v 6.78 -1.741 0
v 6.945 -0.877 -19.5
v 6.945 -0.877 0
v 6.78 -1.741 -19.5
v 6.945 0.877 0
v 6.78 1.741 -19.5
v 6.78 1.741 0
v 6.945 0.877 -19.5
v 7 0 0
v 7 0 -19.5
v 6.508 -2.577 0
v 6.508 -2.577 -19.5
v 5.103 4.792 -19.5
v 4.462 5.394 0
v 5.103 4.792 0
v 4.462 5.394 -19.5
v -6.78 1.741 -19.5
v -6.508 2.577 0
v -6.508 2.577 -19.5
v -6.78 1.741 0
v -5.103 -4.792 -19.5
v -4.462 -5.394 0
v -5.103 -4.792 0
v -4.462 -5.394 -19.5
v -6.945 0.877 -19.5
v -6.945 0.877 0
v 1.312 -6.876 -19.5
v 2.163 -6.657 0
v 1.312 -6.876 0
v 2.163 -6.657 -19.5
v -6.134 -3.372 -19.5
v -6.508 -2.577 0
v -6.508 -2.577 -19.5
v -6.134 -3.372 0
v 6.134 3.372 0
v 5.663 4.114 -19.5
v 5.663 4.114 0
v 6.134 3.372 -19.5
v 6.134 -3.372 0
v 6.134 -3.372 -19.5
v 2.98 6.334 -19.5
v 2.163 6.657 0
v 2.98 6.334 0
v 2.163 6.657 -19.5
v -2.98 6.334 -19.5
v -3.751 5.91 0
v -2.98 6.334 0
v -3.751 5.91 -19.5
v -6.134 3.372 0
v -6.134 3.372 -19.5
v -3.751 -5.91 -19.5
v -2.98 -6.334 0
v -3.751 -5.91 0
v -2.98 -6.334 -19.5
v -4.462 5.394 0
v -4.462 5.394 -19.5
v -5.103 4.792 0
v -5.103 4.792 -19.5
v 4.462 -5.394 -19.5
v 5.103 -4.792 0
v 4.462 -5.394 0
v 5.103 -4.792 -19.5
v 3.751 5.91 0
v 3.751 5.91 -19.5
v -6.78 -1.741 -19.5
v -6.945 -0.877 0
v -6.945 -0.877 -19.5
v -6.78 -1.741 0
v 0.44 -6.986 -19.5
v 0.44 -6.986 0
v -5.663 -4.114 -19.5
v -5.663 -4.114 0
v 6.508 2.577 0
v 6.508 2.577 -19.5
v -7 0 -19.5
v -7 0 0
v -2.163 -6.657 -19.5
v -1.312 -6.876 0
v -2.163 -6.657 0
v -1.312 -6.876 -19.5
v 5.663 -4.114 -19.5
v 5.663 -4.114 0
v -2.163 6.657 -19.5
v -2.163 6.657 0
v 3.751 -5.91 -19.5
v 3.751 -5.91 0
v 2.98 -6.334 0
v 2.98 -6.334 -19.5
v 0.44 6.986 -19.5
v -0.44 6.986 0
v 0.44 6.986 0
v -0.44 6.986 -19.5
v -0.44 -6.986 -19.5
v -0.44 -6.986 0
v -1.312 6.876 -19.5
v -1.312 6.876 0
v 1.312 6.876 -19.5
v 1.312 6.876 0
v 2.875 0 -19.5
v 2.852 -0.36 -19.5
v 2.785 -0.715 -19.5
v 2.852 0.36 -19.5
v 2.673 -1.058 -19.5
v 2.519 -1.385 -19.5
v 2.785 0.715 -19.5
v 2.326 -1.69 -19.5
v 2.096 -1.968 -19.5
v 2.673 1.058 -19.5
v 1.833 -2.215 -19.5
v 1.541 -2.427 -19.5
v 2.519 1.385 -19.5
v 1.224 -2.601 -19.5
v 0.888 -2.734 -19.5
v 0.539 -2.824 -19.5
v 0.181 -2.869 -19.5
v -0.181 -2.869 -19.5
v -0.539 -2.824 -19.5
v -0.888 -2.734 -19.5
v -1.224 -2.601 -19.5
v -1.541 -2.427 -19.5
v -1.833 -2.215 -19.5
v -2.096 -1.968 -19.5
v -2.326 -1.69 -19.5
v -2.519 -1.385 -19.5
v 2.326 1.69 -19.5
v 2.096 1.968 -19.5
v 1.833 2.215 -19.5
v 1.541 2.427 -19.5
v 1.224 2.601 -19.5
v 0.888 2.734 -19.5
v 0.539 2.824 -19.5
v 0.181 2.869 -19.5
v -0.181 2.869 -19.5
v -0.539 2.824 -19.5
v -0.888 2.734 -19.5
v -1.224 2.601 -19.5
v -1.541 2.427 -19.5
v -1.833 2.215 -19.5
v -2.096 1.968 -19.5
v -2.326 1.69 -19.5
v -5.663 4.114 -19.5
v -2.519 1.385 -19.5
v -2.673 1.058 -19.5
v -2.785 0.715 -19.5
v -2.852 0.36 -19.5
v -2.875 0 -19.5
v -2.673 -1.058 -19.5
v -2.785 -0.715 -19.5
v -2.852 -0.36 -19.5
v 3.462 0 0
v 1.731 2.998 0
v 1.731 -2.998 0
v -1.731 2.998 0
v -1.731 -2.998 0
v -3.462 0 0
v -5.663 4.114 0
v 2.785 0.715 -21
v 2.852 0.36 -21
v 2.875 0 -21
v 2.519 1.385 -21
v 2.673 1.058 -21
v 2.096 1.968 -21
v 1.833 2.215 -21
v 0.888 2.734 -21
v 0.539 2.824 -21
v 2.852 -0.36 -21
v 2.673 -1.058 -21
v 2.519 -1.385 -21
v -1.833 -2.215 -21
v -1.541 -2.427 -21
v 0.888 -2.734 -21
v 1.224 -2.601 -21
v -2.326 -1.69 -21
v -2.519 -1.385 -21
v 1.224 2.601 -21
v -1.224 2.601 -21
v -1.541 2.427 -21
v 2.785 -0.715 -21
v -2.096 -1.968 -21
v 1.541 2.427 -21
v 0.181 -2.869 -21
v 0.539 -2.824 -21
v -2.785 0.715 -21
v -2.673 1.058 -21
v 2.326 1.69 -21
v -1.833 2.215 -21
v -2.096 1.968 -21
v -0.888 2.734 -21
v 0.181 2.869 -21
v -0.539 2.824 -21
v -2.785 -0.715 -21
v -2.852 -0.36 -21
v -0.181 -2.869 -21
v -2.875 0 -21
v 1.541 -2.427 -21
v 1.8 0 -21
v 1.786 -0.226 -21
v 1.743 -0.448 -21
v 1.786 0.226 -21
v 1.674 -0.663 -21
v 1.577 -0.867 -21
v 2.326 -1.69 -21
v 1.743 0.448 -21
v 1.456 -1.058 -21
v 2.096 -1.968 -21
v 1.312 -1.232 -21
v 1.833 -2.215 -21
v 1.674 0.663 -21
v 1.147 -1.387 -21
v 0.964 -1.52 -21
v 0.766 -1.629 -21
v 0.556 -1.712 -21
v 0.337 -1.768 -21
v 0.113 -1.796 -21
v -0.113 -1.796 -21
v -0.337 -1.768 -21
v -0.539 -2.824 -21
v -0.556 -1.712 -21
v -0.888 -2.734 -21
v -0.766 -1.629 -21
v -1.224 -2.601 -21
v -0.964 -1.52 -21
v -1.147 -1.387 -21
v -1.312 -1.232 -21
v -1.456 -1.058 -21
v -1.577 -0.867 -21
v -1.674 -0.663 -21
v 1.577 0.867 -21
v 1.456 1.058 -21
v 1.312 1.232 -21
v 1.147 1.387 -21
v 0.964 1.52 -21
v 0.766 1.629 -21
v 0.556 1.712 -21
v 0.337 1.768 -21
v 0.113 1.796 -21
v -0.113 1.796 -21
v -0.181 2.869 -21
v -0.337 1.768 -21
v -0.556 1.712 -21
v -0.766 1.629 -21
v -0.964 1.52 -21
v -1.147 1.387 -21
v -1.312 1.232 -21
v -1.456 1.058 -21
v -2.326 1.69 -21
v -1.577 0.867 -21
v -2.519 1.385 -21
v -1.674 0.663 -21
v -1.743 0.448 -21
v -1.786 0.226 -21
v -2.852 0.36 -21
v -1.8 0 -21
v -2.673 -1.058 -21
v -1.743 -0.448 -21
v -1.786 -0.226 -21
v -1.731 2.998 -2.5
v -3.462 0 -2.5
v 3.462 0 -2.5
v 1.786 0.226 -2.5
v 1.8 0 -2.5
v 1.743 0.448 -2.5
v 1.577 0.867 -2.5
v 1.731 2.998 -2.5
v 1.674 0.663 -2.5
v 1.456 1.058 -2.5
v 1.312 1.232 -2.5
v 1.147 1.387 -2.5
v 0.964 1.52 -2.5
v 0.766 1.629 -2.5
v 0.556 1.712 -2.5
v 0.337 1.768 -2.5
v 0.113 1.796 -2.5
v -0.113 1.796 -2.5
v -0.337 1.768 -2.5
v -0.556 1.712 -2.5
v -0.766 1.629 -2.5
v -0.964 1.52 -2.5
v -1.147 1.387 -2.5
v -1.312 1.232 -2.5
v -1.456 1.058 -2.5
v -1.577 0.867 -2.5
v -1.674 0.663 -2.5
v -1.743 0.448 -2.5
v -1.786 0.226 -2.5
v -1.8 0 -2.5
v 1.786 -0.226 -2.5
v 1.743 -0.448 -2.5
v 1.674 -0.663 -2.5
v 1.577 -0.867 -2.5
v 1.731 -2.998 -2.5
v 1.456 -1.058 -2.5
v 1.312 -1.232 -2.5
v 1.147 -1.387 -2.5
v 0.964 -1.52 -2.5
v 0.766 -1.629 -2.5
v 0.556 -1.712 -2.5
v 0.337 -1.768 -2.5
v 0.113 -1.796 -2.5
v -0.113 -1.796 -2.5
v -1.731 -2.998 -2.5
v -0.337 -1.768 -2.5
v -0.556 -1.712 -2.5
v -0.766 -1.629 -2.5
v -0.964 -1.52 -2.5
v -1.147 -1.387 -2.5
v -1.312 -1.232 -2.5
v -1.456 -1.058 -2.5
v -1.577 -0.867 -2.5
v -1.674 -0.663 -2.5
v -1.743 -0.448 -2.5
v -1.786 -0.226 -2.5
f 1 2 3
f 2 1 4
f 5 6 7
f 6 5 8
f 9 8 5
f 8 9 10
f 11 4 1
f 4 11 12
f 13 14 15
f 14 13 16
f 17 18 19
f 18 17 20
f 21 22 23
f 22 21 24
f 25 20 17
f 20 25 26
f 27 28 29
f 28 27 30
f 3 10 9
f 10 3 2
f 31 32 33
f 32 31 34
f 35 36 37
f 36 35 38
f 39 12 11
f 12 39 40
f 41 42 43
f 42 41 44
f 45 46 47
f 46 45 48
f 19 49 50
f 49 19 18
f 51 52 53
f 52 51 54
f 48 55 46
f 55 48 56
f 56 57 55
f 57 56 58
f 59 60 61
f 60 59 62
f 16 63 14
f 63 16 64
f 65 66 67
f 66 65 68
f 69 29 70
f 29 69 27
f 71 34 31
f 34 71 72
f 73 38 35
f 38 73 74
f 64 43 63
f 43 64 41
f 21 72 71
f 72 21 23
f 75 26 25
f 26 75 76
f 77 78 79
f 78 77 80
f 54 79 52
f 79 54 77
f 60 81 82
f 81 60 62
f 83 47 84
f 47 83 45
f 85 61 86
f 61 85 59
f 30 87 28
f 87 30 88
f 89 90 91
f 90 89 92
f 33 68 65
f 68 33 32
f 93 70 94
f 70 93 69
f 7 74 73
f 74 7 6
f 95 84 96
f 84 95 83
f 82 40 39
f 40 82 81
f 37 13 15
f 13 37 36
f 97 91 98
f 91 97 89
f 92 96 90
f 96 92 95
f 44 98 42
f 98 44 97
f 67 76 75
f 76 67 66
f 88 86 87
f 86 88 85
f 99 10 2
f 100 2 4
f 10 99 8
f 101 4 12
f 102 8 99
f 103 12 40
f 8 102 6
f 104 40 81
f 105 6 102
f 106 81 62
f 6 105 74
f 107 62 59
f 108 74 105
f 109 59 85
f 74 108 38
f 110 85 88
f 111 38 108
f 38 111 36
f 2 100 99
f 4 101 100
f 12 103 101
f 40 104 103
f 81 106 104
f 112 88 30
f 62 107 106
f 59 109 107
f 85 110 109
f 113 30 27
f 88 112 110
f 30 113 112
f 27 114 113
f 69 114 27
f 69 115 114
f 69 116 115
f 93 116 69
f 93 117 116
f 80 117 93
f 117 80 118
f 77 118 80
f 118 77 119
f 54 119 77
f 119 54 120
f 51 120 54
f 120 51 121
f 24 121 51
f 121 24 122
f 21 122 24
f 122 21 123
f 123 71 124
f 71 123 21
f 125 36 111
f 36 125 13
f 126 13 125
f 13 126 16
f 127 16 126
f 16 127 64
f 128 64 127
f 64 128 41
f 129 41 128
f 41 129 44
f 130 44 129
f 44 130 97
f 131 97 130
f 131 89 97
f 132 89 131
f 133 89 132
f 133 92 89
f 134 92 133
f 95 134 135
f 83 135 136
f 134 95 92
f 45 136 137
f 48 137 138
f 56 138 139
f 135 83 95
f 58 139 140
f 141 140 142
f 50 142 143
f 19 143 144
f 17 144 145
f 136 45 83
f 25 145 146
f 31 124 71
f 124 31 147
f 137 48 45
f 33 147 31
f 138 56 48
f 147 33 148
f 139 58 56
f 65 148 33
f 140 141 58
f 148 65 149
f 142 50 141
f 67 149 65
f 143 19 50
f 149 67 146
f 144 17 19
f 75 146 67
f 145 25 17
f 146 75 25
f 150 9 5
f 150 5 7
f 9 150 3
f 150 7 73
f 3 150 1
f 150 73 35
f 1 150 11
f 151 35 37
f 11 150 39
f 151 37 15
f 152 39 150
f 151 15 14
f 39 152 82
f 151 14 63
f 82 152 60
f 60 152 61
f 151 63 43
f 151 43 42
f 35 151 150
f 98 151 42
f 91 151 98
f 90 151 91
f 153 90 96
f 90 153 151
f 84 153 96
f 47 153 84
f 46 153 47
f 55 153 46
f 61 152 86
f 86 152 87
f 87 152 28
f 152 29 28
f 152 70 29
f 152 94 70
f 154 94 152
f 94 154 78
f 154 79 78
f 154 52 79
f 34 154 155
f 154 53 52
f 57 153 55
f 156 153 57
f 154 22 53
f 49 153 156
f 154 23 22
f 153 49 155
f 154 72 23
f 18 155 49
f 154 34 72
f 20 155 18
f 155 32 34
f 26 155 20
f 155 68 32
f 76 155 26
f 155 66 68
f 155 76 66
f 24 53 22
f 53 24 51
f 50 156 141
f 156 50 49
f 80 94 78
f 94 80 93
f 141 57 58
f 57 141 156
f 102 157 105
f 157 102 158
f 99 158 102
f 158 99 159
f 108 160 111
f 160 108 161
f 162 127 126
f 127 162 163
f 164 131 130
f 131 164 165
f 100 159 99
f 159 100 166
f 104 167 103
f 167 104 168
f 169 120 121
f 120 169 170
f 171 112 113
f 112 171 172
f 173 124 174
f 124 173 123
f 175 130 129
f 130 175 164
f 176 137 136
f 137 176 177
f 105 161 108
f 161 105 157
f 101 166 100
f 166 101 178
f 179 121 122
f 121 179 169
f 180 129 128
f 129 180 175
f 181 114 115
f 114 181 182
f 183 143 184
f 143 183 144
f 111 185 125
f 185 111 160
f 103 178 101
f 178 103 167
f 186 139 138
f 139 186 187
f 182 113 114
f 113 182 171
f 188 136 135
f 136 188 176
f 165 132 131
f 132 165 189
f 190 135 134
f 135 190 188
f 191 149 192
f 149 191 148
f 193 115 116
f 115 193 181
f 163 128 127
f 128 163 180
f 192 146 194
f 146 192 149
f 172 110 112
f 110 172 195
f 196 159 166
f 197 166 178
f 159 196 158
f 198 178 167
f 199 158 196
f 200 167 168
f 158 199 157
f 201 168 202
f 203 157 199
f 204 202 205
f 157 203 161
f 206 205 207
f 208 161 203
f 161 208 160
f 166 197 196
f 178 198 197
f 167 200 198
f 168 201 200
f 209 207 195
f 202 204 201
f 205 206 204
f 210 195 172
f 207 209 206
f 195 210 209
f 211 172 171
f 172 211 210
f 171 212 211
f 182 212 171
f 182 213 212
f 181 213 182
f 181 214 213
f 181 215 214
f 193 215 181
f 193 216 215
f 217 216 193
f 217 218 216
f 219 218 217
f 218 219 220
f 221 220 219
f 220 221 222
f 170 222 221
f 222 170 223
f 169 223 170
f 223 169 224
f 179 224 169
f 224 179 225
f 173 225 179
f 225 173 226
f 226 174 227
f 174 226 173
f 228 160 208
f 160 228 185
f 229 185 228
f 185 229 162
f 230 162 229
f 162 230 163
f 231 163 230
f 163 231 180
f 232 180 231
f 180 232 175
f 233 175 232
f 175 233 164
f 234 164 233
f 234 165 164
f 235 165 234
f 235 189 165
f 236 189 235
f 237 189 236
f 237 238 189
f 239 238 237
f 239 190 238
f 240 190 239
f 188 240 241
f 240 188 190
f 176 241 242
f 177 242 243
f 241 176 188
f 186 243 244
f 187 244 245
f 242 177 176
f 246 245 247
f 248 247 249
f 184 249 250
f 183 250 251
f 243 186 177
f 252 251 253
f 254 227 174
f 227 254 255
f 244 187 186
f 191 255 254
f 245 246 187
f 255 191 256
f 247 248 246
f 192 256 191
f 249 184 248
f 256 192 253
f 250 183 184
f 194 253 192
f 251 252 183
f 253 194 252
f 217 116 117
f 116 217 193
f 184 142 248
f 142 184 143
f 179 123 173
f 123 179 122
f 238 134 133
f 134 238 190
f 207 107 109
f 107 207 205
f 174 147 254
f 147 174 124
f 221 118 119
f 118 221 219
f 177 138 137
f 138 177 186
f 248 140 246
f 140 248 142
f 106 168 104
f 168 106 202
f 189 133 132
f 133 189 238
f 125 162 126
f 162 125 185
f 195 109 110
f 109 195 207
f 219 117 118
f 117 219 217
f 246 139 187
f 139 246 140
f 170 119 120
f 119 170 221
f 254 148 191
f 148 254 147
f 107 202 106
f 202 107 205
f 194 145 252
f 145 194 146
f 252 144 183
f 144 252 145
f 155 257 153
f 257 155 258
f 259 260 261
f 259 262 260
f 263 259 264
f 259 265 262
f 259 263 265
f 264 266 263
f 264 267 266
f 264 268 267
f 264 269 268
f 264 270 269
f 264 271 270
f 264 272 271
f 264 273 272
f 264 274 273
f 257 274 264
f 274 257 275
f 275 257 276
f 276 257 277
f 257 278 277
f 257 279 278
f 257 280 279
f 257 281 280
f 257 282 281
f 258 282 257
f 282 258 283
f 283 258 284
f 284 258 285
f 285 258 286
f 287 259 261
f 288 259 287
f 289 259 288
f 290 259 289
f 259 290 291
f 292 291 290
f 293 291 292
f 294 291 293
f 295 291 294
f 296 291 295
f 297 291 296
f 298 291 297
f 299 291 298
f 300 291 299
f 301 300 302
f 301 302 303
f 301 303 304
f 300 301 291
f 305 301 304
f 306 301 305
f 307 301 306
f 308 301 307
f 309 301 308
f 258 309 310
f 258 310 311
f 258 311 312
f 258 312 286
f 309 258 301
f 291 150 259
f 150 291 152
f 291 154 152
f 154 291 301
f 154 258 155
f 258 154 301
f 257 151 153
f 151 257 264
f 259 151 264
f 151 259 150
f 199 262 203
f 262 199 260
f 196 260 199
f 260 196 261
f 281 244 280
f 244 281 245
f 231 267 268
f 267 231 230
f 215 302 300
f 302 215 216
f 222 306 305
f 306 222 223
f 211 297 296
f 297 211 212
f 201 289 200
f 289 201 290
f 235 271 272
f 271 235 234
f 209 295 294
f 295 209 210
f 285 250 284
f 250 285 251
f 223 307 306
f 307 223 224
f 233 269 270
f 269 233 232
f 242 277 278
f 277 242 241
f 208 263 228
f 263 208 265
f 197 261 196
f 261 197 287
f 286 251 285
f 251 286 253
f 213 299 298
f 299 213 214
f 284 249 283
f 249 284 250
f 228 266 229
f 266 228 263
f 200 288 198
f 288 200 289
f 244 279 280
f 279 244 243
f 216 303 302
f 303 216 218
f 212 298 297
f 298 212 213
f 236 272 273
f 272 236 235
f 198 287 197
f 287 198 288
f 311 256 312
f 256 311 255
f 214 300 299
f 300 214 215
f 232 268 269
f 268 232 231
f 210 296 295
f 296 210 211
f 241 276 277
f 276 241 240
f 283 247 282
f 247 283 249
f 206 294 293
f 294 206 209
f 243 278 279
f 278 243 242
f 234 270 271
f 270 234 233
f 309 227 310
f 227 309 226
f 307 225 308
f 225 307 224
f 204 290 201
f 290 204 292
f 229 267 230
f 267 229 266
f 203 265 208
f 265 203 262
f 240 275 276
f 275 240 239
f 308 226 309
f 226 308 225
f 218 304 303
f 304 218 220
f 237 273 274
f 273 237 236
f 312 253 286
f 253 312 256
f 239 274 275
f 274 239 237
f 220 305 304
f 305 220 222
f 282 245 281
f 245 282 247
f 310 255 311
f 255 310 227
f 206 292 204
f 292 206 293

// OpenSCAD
$fn = 50;


difference() {
	union() {
		translate(v = [0, 0, -19.5000000000]) {
			cylinder(h = 19.5000000000, r = 7.0000000000);
		}
		#translate(v = [0, 0, -21.0000000000]) {
			cylinder(h = 21, r = 2.8750000000);
		}
	}
	union() {
		translate(v = [0, 0, 0]) {
			rotate(a = [0, 0, 0]) {
				difference() {
					union() {
						translate(v = [0, 0, -2.5000000000]) {
							linear_extrude(height = 2.5000000000) {
								polygon(points = [[3.4620000000, 0.0000000000], [1.7310000000, 2.9981799479], [-1.7310000000, 2.9981799479], [-3.4620000000, 0.0000000000], [-1.7310000000, -2.9981799479], [1.7310000000, -2.9981799479]]);
							}
						}
					}
					union();
				}
			}
		}
		#translate(v = [0, 0, -100.0000000000]) {
			cylinder(h = 200, r = 1.8000000000);
		}
	}
}
